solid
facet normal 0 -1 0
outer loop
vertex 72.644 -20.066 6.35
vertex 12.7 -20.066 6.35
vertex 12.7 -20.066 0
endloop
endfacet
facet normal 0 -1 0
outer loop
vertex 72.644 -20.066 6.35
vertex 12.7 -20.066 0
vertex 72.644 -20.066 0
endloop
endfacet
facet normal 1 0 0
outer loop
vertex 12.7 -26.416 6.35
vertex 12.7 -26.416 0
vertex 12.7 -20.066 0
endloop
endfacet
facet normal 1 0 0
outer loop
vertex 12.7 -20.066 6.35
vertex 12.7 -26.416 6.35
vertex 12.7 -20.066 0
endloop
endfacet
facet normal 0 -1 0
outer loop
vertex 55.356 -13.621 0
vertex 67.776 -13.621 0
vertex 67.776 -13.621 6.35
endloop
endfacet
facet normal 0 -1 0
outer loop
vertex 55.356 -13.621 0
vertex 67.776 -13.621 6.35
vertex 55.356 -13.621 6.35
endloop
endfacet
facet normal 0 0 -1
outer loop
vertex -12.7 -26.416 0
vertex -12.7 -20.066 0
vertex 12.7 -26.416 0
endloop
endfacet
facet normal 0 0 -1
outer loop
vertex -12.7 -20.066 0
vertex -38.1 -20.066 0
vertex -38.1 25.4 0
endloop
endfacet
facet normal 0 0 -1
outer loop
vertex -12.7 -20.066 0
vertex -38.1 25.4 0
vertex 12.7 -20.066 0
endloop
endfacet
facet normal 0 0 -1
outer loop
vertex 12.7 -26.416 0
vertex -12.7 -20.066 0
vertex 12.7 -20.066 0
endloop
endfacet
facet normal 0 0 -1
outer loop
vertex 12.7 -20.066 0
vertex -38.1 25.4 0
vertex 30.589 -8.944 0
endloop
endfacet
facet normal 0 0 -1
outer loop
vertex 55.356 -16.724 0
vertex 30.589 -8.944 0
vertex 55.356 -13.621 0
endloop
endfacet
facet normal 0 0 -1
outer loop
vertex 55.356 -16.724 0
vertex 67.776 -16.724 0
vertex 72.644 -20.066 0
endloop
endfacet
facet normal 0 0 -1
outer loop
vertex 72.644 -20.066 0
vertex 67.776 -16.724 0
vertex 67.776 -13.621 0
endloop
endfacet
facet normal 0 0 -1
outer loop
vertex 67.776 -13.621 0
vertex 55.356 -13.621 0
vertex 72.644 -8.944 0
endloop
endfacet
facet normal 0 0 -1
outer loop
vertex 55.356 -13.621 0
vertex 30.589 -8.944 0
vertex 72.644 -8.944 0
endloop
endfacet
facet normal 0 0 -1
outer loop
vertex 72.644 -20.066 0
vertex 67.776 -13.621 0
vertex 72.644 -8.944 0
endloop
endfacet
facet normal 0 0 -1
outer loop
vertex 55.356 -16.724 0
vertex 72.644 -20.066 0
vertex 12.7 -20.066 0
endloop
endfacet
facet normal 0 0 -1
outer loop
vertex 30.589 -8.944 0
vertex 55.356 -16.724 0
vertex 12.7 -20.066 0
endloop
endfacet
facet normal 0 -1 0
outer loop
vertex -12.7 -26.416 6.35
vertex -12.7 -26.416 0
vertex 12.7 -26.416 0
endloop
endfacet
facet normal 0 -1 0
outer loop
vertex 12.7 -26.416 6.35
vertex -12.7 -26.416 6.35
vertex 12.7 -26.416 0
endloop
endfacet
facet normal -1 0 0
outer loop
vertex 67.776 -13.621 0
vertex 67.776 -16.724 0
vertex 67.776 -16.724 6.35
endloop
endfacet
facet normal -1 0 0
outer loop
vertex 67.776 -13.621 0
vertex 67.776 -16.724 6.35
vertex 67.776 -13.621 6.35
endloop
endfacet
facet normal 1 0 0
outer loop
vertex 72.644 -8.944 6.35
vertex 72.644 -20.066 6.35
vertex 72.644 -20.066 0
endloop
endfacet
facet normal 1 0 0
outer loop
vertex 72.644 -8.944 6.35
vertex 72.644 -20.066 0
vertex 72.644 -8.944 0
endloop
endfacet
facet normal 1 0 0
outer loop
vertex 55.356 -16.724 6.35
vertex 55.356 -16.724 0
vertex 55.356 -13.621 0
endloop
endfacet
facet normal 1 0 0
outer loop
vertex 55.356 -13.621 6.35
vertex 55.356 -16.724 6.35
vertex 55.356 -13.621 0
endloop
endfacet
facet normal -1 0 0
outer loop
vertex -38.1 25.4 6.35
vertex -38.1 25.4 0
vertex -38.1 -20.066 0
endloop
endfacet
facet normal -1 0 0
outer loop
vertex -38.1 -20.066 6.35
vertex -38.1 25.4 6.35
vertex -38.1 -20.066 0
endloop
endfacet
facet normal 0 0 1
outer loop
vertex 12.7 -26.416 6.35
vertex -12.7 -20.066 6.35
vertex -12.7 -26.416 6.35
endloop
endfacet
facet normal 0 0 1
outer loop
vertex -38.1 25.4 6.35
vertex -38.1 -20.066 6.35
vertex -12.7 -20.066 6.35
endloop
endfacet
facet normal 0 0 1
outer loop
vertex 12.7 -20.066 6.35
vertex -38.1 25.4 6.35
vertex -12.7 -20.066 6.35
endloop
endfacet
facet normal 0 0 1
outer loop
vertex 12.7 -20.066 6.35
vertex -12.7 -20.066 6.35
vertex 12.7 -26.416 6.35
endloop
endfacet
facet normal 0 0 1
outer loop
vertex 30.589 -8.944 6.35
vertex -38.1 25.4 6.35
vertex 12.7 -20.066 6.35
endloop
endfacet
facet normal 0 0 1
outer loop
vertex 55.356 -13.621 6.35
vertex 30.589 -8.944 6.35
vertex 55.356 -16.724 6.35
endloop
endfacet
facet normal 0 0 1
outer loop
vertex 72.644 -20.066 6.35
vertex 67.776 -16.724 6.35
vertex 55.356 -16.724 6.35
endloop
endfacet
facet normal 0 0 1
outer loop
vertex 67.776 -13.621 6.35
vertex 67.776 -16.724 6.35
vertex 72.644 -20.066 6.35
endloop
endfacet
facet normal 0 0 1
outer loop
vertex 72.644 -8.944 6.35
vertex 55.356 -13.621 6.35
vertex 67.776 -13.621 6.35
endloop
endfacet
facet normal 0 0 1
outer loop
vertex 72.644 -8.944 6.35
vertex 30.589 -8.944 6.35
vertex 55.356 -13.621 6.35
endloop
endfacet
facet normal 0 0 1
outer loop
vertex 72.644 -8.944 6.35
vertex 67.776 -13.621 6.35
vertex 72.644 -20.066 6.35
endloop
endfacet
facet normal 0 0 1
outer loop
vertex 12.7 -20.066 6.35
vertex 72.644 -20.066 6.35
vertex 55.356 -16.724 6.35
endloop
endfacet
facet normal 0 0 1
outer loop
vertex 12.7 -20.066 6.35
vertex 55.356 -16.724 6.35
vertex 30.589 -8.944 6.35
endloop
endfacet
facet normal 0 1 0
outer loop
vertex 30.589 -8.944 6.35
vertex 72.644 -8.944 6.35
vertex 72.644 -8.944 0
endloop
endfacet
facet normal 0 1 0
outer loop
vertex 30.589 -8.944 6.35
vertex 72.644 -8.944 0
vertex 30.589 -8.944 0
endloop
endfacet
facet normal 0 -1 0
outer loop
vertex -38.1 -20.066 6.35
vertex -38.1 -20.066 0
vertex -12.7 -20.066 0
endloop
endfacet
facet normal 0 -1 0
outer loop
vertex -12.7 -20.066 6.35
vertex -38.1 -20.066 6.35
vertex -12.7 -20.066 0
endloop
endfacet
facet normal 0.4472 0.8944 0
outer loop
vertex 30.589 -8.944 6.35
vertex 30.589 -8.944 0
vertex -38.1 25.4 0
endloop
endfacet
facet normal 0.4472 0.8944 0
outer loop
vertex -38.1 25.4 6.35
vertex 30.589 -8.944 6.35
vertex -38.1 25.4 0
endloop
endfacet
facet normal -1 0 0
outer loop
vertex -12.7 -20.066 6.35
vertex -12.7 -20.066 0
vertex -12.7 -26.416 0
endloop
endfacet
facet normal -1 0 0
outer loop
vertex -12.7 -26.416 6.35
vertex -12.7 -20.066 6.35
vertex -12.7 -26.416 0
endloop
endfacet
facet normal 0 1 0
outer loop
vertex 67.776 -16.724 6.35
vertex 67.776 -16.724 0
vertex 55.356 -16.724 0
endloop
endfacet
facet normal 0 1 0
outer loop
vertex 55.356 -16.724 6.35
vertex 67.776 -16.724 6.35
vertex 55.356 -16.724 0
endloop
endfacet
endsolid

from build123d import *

# Parameters (mm, degrees)
BOSS_EXTRUDE1_DEPTH = 6.35
BOSS_EXTRUDE2_DEPTH = 6.35
SKETCH4_W           = 12.419699812
SKETCH4_H           = 3.102298877
CUT_EXTRUDE1_DEPTH  = 7.35


with BuildPart() as part:
    # Sketch1 → Boss-Extrude1 (new body)
    with BuildSketch(Plane.XY):
        Polygon((-38.1, -20.066), (-12.7, -20.066), (-12.7, -26.416), (12.7, -26.416), (12.7, -20.066), (38.1, -20.066), (38.1, -12.7), (-38.1, 25.4), align=None)
    extrude(amount=BOSS_EXTRUDE1_DEPTH)

    # Sketch2 → Boss-Extrude2 (add, through all)
    with BuildSketch(Plane.XY.offset(6.35)):
        Polygon((38.1, -20.066), (72.644, -20.066), (72.644, -12.7), (72.644, -8.944268717), (30.588537433, -8.944268717), (38.1, -12.7), align=None)
    extrude(amount=-BOSS_EXTRUDE2_DEPTH)

    # Sketch4 → Cut-Extrude1 (cut, through all)
    with BuildSketch(Plane(origin=(0, 0, 0), x_dir=(-1, 0, 0), z_dir=(0, 0, -1))):
        with Locations((-61.565974267, -15.172394908)):
            Rectangle(SKETCH4_W, SKETCH4_H)
    extrude(amount=-CUT_EXTRUDE1_DEPTH, mode=Mode.SUBTRACT)


solid = part.part
